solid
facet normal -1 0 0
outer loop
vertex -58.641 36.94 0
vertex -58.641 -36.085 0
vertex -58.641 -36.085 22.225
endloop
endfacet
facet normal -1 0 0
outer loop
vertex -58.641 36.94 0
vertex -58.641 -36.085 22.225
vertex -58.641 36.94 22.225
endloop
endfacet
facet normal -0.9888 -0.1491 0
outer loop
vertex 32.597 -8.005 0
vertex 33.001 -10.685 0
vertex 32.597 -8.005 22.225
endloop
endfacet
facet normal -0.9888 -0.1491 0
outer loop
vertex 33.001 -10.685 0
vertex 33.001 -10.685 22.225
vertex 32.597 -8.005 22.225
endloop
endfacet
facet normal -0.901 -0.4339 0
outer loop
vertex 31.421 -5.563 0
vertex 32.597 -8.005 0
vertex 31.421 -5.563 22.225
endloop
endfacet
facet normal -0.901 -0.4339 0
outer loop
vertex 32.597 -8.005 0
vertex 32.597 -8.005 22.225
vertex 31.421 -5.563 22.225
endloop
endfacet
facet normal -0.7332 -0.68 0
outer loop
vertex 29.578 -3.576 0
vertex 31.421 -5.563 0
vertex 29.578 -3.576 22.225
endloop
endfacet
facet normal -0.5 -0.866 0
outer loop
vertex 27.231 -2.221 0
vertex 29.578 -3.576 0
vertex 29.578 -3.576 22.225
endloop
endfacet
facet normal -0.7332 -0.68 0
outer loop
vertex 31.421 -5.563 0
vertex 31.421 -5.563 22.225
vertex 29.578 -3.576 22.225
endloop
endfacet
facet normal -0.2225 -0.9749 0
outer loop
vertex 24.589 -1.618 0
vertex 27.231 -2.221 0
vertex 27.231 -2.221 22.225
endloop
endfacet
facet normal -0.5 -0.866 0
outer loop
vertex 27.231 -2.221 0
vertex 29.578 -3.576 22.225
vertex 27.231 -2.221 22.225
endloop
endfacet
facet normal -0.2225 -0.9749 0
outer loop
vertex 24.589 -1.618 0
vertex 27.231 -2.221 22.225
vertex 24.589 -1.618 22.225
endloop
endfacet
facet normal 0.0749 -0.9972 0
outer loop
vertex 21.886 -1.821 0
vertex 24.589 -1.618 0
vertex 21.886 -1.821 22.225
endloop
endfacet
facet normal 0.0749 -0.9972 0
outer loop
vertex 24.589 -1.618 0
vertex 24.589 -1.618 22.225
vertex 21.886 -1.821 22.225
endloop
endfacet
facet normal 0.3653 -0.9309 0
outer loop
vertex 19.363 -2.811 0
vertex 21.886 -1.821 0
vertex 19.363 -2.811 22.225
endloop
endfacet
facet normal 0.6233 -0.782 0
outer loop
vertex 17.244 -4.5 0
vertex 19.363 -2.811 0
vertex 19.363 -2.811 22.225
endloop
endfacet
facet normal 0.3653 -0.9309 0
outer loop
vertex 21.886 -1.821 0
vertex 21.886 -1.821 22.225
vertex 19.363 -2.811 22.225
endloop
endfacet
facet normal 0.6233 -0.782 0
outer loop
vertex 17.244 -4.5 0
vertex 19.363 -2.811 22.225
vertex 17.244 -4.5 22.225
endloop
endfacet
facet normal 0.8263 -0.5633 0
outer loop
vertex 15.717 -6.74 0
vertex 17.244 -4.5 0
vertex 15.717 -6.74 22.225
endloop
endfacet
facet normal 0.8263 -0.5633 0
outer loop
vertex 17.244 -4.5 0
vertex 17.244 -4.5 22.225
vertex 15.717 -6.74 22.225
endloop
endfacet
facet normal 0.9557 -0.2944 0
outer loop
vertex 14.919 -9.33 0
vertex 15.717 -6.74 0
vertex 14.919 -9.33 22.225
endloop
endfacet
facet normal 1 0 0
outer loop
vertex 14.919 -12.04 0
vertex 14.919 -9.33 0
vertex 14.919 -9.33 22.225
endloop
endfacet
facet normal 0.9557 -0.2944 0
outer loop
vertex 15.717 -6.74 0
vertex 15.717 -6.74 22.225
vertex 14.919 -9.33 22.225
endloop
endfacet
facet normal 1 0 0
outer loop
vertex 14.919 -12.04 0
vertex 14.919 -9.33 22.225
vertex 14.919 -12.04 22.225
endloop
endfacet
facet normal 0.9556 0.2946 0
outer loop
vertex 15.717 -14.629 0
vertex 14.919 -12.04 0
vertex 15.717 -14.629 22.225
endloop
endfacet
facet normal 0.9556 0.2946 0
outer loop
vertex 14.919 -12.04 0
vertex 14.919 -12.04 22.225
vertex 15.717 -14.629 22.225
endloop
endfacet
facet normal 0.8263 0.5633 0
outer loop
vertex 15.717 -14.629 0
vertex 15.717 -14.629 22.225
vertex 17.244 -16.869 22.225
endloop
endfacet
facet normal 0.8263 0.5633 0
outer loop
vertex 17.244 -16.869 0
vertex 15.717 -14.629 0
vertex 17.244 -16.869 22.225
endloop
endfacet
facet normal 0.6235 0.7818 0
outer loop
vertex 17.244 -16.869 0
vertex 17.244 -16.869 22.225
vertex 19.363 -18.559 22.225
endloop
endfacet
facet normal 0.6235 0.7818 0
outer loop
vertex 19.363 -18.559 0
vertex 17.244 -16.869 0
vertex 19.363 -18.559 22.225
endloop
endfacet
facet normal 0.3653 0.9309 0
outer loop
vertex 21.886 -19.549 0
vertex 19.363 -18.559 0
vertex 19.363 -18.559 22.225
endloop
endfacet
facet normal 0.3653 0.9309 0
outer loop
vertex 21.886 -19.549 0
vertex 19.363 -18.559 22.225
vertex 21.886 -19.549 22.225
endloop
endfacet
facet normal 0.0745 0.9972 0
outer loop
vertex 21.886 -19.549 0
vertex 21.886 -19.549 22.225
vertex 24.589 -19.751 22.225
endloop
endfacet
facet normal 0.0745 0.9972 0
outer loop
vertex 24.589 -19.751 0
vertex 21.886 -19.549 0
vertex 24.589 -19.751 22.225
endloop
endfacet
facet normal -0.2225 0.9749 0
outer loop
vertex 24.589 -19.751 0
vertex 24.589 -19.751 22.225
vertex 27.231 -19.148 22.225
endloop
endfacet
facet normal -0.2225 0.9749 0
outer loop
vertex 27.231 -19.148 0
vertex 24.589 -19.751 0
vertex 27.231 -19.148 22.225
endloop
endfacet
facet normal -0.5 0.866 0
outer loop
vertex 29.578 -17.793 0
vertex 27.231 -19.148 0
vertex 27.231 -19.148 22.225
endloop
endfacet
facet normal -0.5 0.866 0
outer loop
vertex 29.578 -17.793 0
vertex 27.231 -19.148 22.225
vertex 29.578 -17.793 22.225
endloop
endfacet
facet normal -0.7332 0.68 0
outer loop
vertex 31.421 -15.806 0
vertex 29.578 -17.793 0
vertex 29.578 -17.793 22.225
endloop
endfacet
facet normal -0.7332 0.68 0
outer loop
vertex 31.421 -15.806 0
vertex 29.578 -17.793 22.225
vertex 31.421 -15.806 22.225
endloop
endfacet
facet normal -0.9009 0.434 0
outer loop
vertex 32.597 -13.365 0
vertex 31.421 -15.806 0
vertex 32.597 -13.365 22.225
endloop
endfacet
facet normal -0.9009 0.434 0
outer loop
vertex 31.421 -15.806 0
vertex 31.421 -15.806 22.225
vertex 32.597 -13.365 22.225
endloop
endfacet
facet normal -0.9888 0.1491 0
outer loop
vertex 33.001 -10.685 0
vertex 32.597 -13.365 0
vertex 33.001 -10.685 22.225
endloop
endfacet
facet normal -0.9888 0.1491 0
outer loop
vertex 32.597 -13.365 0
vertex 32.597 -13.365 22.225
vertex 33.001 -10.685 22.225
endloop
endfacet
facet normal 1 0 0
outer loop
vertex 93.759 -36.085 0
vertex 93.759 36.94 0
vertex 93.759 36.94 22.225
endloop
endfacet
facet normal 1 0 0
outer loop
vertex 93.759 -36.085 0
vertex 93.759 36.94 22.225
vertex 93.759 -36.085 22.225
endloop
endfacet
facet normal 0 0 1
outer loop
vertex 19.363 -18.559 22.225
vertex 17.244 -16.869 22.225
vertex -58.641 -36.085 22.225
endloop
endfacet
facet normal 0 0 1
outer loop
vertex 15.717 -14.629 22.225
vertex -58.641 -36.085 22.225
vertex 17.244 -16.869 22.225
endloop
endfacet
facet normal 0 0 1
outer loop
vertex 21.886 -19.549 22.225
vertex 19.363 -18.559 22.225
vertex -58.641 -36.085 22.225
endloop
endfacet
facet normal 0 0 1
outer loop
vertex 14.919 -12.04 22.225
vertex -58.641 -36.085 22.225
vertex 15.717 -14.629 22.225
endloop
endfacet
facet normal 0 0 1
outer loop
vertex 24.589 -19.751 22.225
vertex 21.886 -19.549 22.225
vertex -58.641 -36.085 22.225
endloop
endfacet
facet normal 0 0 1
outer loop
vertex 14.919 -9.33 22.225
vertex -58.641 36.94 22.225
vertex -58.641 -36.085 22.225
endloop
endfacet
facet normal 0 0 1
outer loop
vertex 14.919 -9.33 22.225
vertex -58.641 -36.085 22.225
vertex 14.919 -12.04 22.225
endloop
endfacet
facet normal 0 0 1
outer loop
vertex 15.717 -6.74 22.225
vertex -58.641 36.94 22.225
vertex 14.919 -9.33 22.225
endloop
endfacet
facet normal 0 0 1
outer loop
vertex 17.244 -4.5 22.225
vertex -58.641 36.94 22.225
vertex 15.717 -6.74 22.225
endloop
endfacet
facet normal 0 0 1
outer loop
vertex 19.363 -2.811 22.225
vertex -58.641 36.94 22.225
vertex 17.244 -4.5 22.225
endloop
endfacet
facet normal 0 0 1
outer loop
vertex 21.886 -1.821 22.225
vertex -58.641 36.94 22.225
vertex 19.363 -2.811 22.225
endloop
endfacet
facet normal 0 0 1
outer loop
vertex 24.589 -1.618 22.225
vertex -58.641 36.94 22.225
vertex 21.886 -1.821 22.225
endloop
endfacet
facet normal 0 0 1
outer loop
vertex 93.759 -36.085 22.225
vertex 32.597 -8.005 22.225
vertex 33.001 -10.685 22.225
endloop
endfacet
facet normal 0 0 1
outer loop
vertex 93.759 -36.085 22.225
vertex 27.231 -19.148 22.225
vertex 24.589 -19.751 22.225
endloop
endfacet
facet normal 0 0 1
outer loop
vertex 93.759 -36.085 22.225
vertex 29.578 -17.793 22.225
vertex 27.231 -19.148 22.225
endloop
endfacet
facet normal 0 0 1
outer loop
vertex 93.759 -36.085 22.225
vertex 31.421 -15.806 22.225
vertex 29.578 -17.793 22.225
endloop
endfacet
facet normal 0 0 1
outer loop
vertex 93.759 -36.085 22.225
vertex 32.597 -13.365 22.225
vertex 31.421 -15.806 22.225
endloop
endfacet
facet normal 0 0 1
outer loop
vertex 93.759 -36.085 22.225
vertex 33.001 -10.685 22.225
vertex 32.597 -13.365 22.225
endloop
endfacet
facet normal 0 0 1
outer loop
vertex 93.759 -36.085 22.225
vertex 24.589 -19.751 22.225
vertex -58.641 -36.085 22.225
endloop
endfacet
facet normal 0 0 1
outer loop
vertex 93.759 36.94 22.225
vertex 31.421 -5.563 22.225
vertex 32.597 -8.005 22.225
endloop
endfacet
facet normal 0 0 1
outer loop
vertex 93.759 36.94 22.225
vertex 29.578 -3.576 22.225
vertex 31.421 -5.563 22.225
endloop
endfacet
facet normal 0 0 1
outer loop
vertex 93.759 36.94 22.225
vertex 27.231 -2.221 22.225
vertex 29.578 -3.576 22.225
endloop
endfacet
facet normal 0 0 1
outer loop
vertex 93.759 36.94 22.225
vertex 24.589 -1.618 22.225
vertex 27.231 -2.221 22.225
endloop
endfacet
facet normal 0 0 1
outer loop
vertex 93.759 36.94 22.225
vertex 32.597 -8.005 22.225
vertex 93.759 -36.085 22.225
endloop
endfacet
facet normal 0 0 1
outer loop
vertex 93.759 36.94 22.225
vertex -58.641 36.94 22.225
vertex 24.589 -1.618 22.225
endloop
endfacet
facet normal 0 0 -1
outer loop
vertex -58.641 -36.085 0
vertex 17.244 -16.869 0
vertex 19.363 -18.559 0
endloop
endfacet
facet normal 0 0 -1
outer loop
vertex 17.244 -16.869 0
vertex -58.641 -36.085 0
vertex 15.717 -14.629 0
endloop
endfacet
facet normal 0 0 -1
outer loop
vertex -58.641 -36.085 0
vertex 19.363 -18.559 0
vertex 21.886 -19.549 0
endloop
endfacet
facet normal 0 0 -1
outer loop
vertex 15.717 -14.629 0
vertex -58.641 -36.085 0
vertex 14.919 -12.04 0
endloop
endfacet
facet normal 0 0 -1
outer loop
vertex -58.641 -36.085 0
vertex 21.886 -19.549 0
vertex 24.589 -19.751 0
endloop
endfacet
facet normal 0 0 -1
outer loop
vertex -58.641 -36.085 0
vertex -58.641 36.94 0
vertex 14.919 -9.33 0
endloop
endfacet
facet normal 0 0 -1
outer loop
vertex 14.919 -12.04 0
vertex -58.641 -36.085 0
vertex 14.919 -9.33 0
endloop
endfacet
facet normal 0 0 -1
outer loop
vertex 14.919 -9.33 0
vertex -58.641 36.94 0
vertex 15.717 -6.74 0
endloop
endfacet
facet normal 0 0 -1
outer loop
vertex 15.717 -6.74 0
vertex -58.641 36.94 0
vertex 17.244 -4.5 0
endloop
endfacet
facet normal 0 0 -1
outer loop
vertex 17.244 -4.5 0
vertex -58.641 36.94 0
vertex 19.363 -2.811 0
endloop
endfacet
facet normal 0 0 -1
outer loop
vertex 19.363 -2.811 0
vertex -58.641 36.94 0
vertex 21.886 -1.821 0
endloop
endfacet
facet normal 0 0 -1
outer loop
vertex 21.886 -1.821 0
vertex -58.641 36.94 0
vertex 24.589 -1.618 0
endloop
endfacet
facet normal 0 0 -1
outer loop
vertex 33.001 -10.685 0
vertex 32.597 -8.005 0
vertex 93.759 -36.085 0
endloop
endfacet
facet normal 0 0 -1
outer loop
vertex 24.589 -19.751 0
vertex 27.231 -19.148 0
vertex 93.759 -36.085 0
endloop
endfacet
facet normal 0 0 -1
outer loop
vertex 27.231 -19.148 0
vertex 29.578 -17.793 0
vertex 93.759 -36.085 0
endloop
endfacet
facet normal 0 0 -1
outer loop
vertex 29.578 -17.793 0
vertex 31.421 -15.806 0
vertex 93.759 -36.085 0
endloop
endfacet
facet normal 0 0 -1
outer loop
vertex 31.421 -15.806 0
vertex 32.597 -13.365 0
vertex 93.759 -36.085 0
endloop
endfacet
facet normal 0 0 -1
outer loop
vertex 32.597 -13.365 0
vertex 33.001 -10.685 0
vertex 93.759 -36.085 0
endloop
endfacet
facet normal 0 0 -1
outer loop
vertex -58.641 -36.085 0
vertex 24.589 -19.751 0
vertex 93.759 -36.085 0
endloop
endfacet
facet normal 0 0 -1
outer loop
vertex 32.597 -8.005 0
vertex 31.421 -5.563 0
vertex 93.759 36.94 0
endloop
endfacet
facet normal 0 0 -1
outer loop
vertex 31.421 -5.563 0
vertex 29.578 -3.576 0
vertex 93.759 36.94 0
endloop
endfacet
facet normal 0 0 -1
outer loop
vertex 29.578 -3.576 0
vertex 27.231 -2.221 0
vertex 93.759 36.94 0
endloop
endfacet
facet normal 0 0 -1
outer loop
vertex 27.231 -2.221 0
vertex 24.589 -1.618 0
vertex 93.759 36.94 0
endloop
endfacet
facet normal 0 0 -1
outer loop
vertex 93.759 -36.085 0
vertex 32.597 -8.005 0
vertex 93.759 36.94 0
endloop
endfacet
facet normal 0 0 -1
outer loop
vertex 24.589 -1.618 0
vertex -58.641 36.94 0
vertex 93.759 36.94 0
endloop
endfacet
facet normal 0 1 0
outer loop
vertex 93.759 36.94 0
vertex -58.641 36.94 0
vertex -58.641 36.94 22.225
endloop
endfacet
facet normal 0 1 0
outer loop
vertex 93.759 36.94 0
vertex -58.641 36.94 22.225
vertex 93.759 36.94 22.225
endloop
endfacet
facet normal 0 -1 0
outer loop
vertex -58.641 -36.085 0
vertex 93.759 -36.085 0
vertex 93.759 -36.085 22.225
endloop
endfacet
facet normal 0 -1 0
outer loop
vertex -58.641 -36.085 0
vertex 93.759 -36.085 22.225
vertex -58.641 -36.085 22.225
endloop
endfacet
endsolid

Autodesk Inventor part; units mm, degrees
ref_plane "YZ Plane" through (0, 0, 0) normal (1, 0, 0) x (0, 1, 0)
ref_plane "XZ Plane" through (0, 0, 0) normal (0, 1, 0) x (-1, 0, 0)
ref_plane "XY Plane" through (0, 0, 0) normal (0, 0, 1) x (1, 0, 0)
sketch "Sketch1" plane through (0, 0, 0) normal (0, 0, 1) x (1, 0, 0)
  line L0 (-58.6409, 36.9404) -> (93.7591, 36.9404)
  line L1 (93.7591, 36.9404) -> (93.7591, -36.0846)
  line L2 (93.7591, -36.0846) -> (-58.6409, -36.0846)
  line L3 (-58.6409, -36.0846) -> (-58.6409, 36.9404)
  point P0 (0, 0)
  dimension "d0" = 152.4
  dimension "d1" = 73.025
extrude "Extrusion1" add sketch "Sketch1" along normal blind 22.225
sketch "Sketch2" plane through (0, 0, 22.225) normal (0, 0, 1) x (1, 0, 0)
  line L0 (-58.6409, 36.9404) -> (-58.6409, -36.0846) projected
  line L1 (-58.6409, -36.0846) -> (93.7591, -36.0846) projected
  circle A0 centre (23.9091, -10.6846) radius 9.092
  point P0 (0, 0)
  dimension "d4" = 82.55
  dimension "d5" = 25.4
extrude "Extrusion2" cut sketch "Sketch2" against normal blind 22.225
properties part number "FrameEndSpacer_NERDS"
